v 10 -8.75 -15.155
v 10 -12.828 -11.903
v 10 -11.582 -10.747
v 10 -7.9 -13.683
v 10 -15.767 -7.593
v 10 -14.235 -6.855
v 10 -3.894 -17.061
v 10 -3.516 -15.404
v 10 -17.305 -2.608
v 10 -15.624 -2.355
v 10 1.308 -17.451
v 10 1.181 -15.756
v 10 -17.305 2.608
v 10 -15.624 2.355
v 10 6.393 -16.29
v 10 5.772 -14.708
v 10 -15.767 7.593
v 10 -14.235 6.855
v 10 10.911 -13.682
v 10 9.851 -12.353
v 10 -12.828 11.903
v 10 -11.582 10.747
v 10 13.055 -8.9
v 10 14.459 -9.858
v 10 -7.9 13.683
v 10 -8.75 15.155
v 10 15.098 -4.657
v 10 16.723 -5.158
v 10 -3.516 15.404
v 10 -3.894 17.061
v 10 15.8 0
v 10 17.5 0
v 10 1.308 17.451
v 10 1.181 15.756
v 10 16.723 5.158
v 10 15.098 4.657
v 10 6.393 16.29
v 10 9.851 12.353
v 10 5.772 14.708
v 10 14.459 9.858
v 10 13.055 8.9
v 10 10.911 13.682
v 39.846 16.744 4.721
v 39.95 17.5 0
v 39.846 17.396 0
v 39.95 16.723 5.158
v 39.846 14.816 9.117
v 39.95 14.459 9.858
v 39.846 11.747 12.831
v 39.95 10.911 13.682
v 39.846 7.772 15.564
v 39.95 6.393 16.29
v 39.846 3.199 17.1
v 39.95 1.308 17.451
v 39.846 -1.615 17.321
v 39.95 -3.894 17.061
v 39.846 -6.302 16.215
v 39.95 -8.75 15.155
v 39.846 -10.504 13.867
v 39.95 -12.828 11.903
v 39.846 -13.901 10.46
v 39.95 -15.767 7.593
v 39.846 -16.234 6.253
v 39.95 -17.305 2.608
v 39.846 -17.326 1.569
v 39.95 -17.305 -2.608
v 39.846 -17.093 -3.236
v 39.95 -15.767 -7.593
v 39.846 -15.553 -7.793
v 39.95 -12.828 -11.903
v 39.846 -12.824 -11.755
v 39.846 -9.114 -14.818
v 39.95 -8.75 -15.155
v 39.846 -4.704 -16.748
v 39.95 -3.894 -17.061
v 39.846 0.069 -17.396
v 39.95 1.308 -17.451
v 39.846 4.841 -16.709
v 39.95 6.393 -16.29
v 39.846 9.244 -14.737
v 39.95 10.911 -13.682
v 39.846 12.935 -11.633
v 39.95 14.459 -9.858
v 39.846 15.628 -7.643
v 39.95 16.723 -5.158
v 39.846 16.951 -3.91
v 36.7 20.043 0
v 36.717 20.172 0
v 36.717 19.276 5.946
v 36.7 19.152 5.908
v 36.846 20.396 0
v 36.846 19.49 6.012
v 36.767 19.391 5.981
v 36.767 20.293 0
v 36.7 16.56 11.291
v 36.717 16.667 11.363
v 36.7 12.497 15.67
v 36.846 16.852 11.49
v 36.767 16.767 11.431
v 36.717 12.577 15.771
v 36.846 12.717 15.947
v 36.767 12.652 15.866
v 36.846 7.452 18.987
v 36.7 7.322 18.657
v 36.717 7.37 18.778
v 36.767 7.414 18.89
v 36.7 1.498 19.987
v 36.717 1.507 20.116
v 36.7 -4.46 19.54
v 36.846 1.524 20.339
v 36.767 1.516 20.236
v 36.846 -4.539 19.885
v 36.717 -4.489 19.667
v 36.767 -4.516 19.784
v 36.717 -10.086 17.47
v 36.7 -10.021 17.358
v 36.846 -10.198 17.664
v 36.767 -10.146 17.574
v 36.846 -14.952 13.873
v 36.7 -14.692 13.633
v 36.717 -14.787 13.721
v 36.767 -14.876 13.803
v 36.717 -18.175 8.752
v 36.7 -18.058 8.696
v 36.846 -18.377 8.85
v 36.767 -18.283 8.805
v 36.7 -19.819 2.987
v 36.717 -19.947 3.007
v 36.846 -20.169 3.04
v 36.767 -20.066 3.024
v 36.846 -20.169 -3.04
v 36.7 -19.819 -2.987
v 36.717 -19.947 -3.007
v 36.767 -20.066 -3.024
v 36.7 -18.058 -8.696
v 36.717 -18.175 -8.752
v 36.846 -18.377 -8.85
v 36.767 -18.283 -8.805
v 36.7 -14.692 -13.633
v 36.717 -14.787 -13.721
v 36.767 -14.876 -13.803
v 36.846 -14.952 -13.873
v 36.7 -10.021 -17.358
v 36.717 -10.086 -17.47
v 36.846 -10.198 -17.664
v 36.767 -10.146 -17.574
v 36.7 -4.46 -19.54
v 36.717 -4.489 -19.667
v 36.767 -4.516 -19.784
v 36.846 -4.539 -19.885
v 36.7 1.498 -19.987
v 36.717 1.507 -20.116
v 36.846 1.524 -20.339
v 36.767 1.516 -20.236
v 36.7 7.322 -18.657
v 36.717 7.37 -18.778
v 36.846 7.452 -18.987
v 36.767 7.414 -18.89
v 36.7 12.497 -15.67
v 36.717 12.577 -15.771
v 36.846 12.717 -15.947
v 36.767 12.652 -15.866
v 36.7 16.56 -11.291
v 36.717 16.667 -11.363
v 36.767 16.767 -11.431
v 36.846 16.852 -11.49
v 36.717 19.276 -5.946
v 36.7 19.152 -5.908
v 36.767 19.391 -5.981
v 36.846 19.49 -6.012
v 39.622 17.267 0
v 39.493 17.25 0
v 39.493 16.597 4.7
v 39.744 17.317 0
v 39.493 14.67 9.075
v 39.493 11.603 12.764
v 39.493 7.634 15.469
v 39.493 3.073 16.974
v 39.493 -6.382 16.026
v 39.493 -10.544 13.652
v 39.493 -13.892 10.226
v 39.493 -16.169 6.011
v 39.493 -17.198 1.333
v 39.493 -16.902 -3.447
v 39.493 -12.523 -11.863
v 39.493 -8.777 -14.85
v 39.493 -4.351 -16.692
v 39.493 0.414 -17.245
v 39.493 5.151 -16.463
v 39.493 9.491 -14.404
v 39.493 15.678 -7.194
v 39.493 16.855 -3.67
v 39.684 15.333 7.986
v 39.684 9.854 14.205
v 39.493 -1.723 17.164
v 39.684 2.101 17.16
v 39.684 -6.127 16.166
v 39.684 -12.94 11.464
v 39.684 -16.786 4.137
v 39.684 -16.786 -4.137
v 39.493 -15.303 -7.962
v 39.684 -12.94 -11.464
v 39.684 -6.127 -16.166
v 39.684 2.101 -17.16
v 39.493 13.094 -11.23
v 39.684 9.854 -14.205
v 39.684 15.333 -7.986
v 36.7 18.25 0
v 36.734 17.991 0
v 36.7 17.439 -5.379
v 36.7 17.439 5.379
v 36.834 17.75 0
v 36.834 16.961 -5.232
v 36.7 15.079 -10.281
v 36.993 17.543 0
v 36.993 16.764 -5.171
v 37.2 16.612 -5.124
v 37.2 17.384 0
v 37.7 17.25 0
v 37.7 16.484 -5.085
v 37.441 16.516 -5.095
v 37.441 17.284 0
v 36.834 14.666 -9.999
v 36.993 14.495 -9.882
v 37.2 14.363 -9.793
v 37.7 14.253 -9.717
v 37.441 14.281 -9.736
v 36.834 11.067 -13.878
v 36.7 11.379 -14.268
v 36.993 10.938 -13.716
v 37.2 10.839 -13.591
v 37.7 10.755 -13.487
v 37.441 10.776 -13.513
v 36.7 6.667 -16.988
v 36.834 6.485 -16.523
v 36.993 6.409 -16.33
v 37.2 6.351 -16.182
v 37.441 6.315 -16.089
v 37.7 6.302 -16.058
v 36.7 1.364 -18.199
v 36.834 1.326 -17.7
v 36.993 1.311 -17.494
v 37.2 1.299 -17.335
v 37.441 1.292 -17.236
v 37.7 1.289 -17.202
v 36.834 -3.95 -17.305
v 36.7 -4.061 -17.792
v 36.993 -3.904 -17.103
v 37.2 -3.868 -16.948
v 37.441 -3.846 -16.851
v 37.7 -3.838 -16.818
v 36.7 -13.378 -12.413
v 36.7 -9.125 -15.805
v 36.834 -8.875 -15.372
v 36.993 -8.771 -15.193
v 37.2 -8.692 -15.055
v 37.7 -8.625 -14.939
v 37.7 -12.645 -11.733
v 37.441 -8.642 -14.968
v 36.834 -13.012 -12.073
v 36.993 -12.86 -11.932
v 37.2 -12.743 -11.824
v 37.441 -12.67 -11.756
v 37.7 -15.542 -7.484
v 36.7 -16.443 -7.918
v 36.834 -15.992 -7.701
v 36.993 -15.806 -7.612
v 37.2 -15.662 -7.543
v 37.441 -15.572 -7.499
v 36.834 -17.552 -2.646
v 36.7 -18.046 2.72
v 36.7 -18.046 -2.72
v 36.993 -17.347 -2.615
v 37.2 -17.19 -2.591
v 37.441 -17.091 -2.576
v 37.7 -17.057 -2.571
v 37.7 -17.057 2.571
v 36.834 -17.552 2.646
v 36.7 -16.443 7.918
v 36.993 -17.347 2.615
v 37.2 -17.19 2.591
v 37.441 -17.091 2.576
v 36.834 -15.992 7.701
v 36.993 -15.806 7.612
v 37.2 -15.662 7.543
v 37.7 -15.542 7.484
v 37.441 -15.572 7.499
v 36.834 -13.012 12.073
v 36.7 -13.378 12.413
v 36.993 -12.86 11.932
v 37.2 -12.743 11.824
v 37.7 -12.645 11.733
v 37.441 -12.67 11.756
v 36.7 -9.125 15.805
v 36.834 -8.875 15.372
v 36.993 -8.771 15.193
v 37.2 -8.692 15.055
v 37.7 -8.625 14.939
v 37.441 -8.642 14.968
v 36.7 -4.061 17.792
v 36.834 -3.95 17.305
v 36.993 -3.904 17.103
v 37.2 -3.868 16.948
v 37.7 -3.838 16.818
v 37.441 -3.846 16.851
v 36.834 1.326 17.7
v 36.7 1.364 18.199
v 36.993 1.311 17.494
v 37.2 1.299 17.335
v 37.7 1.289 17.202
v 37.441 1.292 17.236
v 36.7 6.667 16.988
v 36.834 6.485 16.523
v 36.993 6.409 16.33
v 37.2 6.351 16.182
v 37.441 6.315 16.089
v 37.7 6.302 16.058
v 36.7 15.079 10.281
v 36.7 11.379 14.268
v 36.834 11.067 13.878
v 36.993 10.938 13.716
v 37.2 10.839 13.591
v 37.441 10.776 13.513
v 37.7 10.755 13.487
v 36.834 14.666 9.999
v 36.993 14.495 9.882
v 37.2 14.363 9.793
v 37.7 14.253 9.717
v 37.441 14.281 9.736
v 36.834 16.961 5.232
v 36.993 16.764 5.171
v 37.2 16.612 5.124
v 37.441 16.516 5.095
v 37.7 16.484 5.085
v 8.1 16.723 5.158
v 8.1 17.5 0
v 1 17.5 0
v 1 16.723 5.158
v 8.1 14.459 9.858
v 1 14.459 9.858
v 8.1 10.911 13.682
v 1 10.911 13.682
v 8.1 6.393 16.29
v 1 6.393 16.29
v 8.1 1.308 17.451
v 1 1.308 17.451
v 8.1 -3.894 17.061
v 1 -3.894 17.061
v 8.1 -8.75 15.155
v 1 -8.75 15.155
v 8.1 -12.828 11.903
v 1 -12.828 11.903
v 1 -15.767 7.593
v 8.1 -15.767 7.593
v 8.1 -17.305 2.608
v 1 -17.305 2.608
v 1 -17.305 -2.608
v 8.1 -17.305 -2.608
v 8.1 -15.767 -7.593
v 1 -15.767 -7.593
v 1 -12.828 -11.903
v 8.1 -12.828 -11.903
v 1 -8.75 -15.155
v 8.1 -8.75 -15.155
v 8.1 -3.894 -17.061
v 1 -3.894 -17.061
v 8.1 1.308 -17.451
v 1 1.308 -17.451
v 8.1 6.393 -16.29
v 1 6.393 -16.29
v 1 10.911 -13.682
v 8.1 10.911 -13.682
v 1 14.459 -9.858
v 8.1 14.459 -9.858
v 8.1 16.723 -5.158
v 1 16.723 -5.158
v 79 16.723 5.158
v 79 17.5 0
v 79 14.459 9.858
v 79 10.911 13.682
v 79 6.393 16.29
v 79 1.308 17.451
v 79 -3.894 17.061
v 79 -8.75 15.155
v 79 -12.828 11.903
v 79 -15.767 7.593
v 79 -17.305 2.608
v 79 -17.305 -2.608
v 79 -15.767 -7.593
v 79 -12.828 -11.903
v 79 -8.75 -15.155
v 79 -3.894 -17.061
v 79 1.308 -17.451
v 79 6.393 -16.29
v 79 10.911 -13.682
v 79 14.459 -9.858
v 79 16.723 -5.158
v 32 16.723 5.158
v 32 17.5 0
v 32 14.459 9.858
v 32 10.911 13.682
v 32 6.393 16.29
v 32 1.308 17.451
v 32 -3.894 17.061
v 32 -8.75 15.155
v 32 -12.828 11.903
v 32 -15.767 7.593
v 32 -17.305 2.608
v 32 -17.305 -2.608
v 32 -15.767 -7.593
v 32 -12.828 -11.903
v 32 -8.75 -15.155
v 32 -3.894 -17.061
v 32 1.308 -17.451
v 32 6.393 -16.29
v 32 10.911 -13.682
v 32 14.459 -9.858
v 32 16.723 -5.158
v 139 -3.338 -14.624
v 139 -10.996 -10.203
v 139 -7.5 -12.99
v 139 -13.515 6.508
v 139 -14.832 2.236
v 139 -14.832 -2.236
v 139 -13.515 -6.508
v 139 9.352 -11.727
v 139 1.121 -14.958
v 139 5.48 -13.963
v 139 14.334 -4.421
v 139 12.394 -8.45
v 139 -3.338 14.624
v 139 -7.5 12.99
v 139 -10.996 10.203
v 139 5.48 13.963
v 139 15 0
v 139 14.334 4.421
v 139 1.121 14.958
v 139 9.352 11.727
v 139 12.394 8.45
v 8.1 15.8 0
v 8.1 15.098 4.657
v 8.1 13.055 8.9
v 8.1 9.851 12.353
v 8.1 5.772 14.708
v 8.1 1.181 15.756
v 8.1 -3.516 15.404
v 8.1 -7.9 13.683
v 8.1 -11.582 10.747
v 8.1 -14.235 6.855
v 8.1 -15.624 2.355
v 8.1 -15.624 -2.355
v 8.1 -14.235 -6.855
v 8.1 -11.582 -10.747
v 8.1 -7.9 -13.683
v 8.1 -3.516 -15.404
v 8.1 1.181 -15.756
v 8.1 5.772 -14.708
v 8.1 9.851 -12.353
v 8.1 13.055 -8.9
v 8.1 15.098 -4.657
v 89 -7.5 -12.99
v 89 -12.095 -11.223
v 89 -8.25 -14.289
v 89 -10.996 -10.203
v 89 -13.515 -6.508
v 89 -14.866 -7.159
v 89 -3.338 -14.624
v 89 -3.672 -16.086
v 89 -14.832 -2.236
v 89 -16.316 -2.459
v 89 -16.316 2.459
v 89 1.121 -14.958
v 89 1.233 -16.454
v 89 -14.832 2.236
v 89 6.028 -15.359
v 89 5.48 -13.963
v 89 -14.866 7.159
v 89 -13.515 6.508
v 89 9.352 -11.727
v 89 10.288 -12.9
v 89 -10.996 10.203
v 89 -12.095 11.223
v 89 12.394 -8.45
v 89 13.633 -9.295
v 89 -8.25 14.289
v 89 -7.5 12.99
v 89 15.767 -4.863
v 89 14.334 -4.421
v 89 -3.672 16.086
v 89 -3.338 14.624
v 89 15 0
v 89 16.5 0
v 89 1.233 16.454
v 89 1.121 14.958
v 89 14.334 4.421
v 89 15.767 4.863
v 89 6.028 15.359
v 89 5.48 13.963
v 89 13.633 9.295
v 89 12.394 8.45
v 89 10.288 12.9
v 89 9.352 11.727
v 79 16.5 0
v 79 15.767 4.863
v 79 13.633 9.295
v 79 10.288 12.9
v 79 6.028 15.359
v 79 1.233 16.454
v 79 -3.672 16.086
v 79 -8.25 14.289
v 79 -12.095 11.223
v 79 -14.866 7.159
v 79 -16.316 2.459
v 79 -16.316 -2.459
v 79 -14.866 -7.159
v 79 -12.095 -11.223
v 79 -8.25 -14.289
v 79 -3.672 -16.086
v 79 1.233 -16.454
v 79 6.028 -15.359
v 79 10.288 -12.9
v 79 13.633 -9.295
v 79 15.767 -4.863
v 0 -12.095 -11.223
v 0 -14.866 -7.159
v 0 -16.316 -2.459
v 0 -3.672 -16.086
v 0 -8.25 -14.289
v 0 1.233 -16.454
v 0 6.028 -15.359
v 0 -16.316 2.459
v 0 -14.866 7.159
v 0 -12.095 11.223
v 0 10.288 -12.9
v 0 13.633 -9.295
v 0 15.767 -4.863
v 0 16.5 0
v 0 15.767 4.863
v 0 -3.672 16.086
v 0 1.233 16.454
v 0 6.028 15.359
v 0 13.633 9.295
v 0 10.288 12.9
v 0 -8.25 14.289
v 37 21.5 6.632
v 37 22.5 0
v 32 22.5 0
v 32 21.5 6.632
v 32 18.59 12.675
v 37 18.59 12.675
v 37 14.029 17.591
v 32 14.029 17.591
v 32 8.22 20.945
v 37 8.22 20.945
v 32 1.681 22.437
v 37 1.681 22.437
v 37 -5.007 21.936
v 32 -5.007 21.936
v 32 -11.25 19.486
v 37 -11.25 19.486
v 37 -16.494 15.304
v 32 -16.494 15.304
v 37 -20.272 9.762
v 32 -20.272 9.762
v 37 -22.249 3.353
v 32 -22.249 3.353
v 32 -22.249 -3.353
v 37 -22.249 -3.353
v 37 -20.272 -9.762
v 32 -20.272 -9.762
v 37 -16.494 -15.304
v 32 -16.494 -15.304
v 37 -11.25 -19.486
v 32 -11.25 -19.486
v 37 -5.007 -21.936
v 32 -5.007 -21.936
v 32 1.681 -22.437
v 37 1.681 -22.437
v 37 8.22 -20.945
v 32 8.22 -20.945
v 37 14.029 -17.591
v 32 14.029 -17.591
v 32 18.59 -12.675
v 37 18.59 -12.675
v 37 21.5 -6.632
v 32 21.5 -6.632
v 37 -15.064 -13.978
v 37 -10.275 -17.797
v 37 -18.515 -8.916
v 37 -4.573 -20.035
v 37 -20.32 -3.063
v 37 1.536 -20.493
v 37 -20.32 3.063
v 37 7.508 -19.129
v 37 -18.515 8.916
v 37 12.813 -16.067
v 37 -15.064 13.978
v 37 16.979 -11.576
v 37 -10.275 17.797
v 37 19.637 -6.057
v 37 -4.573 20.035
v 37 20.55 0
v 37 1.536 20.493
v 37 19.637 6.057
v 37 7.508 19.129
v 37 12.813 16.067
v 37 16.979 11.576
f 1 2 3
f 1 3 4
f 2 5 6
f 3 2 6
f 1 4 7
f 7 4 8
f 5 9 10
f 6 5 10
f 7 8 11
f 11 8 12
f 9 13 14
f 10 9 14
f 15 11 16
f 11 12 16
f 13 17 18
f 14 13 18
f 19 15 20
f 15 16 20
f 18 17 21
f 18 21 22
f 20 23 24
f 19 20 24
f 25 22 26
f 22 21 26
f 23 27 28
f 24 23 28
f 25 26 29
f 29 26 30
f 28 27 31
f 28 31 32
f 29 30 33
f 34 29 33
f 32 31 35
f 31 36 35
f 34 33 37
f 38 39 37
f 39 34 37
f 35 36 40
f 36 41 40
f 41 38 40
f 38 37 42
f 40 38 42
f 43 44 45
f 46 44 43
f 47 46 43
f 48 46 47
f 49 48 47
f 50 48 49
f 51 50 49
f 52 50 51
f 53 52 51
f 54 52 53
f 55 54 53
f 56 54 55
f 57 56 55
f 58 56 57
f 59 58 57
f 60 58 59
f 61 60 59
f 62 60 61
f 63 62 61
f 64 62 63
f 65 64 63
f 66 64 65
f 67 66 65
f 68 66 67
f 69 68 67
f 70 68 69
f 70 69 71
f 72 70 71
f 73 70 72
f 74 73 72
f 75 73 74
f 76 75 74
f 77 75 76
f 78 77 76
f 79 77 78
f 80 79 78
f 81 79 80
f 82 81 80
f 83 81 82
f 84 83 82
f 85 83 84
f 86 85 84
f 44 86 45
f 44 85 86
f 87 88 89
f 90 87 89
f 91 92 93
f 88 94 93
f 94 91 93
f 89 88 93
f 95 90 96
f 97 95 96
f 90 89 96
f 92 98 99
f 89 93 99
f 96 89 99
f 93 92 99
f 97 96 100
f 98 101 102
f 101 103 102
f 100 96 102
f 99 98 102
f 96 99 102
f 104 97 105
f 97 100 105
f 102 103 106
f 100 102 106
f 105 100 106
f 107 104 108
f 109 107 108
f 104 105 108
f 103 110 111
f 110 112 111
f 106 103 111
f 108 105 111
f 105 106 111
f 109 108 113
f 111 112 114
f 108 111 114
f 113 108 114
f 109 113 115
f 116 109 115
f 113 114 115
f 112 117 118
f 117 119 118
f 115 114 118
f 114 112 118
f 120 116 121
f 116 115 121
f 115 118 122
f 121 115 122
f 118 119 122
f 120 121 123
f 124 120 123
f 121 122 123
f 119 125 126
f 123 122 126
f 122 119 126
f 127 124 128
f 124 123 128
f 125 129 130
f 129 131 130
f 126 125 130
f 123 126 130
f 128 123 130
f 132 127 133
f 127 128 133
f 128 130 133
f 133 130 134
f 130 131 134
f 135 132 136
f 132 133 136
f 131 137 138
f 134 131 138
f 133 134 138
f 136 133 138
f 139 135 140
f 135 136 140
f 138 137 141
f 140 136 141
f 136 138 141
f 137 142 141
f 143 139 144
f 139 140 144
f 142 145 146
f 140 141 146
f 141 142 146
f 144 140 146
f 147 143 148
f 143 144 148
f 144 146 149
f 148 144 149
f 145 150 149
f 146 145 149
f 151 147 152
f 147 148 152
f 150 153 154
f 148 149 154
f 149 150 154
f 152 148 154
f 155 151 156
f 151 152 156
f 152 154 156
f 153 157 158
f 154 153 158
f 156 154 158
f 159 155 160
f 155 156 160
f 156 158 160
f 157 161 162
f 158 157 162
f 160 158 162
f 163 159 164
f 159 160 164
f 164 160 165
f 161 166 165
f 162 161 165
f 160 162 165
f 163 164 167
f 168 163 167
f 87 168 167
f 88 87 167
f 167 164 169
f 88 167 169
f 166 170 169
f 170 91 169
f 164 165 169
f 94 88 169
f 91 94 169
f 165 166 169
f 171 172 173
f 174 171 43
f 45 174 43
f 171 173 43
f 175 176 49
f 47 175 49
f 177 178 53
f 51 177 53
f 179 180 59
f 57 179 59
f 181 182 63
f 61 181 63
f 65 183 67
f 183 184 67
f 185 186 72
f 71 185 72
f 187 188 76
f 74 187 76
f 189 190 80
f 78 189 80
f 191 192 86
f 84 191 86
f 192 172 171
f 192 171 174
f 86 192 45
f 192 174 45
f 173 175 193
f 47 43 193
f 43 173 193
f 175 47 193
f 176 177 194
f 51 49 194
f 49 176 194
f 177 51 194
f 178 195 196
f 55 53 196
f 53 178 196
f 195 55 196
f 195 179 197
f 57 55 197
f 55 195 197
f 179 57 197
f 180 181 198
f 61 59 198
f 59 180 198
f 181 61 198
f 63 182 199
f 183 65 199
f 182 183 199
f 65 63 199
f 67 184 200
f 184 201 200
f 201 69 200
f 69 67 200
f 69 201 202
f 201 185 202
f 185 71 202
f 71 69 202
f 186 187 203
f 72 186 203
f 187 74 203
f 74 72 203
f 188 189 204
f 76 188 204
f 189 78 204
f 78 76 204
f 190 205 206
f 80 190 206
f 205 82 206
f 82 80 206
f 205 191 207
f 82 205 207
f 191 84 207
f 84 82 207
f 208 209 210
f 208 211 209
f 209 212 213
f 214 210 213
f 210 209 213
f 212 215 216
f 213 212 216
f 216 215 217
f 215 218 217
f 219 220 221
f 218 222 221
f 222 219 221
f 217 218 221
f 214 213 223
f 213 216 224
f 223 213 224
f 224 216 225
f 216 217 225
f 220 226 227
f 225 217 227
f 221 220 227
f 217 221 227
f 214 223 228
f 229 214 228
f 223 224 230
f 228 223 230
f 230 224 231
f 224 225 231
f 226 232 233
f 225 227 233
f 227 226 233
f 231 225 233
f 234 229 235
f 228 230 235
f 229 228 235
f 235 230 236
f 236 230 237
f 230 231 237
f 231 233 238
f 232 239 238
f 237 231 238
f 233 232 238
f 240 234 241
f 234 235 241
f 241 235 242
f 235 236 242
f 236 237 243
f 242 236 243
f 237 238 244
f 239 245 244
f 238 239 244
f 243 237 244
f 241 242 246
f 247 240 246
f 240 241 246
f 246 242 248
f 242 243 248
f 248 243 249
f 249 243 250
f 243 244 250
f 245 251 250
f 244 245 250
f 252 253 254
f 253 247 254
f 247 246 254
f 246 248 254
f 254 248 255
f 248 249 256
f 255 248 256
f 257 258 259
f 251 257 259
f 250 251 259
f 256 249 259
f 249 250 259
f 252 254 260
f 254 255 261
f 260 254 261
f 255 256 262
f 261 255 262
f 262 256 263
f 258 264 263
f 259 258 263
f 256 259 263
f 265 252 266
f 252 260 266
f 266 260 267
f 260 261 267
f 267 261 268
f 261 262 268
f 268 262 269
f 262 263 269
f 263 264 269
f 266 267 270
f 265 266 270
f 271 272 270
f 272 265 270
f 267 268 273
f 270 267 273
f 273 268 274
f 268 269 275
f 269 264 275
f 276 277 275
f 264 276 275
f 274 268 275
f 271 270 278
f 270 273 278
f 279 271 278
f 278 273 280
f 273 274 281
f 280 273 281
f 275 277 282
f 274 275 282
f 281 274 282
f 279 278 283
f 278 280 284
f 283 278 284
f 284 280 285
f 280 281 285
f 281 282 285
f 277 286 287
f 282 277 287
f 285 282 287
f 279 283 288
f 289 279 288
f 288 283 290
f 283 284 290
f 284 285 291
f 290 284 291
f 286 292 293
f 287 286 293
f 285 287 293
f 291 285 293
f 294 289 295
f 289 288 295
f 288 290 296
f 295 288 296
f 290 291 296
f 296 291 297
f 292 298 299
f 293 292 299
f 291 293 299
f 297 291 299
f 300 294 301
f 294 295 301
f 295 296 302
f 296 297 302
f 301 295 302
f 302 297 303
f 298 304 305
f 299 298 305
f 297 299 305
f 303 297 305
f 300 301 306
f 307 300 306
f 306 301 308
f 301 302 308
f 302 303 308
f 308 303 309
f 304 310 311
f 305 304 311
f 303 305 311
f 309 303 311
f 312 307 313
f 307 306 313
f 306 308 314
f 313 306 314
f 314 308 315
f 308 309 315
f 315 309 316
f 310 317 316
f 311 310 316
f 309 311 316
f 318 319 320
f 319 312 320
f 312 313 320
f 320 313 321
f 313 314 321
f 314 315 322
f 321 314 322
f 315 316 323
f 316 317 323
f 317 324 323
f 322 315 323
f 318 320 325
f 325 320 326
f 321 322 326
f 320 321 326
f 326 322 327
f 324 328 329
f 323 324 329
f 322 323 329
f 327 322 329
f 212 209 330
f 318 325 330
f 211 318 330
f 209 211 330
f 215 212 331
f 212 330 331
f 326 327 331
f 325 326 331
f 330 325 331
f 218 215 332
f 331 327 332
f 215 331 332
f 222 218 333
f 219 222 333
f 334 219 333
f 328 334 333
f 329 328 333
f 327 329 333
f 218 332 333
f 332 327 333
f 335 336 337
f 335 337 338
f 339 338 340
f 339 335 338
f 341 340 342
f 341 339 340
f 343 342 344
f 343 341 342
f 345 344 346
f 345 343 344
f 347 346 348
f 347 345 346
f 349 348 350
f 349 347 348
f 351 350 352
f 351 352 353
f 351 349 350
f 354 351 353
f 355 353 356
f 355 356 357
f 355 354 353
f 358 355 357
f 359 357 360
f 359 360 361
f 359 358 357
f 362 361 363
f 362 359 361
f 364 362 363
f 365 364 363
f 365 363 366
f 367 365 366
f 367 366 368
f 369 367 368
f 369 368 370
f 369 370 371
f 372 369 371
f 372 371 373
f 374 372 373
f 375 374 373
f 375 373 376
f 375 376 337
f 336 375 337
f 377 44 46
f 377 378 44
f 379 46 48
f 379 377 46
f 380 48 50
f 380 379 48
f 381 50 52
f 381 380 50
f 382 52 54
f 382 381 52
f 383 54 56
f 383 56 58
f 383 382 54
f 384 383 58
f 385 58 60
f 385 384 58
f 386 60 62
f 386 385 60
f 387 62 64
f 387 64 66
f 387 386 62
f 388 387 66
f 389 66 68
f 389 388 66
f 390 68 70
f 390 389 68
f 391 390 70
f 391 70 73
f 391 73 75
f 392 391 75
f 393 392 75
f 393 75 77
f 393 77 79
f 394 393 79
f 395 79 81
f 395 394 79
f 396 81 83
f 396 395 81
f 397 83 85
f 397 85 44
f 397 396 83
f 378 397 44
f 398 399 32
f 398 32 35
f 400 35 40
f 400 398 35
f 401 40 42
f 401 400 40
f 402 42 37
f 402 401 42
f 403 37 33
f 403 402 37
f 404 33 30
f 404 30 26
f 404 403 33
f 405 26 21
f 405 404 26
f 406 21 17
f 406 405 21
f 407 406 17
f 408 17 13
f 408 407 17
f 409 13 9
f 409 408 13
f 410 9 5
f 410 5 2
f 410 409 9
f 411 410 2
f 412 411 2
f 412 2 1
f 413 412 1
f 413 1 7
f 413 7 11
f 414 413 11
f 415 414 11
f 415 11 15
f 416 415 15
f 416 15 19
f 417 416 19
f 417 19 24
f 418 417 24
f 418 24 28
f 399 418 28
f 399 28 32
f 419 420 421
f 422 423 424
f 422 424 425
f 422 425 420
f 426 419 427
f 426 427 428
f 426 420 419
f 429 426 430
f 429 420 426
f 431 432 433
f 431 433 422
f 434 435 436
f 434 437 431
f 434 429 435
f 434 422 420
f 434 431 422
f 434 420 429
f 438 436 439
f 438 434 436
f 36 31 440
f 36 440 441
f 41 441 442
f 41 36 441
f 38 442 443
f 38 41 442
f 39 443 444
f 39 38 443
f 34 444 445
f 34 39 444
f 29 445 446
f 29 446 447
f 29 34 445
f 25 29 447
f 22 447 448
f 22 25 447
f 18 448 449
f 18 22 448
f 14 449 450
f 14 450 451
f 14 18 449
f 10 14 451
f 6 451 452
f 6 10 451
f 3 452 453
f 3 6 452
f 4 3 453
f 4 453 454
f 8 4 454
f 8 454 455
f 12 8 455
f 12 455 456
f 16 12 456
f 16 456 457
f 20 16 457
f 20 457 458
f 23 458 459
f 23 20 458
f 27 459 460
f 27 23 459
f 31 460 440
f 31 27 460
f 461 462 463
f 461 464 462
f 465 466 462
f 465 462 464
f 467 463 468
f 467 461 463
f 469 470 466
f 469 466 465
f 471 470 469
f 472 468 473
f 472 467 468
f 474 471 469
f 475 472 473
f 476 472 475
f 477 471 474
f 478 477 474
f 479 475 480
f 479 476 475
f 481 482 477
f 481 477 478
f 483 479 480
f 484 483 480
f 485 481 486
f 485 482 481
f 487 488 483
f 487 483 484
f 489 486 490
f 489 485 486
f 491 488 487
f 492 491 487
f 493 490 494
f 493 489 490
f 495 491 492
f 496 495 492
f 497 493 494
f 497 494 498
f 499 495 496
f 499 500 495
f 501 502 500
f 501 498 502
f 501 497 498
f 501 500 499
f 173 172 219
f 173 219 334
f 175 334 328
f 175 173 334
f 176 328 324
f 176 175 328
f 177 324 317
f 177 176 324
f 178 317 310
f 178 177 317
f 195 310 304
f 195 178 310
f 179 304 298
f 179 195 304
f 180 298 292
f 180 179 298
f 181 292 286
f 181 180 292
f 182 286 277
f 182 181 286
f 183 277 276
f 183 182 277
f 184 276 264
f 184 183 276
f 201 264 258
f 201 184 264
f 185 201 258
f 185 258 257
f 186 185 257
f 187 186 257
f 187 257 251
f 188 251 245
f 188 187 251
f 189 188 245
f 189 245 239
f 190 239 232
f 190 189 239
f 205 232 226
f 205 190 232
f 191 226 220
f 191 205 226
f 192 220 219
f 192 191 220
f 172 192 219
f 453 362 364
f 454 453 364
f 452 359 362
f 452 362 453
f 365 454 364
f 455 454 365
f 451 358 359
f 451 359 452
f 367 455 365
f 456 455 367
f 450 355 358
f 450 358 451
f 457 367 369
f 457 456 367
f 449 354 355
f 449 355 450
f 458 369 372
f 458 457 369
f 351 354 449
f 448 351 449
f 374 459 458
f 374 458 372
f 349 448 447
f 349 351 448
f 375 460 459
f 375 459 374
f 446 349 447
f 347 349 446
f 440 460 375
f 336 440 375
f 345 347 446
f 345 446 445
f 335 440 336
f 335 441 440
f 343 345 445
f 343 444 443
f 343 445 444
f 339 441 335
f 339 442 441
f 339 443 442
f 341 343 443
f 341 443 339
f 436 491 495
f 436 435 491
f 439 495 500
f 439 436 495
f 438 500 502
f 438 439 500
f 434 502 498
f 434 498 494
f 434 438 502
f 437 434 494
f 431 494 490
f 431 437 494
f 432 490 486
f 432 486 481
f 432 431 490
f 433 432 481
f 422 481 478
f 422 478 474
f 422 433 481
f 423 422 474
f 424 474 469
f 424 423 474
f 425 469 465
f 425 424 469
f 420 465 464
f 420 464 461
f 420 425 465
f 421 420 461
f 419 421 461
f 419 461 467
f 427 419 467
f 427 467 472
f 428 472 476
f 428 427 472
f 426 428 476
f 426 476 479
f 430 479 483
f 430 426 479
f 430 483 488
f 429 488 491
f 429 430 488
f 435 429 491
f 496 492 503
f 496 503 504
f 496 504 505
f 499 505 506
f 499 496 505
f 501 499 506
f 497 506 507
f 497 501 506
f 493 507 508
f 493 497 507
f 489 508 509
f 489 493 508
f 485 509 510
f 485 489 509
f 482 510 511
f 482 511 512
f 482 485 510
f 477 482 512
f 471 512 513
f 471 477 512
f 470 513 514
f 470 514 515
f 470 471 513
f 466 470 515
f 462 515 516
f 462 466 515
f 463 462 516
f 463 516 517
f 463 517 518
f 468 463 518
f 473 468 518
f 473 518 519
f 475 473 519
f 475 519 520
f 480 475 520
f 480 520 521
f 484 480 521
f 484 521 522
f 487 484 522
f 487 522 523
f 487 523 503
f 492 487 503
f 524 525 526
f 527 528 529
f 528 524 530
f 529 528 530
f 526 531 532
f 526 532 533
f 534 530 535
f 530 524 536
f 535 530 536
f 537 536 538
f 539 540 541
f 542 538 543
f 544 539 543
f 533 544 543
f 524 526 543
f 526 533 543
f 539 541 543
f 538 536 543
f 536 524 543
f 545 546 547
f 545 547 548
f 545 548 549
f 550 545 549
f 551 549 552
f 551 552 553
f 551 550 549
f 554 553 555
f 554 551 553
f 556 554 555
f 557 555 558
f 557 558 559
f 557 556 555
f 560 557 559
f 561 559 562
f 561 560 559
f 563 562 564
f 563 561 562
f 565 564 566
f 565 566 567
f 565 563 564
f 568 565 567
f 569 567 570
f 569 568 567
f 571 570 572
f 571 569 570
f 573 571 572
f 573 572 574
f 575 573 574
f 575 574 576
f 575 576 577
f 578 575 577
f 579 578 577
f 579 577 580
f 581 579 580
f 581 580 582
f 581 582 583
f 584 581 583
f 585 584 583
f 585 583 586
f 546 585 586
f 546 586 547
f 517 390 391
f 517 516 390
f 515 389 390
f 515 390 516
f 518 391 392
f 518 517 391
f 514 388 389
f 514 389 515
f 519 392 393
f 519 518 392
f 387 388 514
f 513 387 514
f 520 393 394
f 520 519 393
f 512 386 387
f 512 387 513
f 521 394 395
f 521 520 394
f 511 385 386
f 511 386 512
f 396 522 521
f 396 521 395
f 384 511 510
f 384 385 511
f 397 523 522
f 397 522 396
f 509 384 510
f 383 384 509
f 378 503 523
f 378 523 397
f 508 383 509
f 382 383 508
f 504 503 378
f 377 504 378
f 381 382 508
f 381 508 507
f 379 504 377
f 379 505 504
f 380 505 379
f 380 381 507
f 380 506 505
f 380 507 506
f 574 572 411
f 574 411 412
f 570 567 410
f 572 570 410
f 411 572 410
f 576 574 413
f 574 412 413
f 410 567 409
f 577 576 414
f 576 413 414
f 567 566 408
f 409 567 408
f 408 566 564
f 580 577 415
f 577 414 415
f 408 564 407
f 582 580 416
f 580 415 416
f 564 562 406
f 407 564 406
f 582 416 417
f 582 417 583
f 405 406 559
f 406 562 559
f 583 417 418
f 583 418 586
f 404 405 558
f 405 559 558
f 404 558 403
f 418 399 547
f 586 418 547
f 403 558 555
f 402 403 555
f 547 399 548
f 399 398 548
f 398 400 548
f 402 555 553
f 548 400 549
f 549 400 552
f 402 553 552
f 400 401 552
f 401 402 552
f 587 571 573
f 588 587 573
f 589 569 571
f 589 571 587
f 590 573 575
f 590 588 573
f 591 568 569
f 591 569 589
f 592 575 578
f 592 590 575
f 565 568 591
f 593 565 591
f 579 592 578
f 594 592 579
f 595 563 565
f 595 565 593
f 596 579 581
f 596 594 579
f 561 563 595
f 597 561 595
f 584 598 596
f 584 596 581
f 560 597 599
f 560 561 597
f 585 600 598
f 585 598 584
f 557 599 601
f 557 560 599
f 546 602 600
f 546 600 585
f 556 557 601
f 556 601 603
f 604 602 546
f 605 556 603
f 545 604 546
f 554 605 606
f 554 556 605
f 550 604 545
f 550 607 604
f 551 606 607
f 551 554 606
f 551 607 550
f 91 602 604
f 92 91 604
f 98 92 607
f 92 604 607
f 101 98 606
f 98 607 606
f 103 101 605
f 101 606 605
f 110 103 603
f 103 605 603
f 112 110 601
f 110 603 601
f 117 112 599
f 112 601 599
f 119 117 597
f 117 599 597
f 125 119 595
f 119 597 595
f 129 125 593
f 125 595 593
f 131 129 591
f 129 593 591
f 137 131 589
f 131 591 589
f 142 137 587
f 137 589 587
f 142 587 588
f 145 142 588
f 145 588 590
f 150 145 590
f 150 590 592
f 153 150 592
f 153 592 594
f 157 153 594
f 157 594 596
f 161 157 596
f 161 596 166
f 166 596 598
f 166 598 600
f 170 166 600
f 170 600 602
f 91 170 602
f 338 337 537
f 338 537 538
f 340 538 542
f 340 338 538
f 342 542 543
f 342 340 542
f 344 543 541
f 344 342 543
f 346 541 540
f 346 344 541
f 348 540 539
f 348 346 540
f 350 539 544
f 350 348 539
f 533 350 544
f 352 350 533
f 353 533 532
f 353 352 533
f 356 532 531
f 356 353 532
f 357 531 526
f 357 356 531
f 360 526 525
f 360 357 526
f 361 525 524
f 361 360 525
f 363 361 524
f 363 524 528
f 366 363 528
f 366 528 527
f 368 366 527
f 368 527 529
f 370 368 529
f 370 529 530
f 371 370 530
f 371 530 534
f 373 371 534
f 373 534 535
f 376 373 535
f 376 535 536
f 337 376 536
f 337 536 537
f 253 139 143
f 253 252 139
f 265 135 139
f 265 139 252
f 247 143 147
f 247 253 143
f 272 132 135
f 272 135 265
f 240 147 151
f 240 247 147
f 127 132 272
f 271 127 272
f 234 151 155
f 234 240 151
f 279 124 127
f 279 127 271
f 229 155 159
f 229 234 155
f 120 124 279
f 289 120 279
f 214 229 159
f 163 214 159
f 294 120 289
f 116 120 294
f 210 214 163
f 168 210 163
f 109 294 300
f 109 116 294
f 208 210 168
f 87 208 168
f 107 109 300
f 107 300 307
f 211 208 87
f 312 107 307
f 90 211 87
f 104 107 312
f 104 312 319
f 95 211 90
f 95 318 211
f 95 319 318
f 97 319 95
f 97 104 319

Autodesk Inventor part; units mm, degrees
ref_plane "YZ Plane" through (0, 0, 0) normal (1, 0, 0) x (0, 1, 0)
ref_plane "XZ Plane" through (0, 0, 0) normal (0, 1, 0) x (-1, 0, 0)
ref_plane "XY Plane" through (0, 0, 0) normal (0, 0, 1) x (1, 0, 0)
sketch "Эскиз1" plane through (0, 0, 0) normal (0, 0, 1) x (1, 0, 0)
  line L0 (0, 0) -> (0, 17.5)
  line L1 (0, 17.5) -> (8.1, 17.5)
  line L2 (8.1, 17.5) -> (8.1, 15.8)
  line L3 (8.1, 15.8) -> (10, 15.8)
  line L4 (10, 15.8) -> (10, 17.5)
  line L5 (10, 17.5) -> (32, 17.5)
  line L6 (32, 17.5) -> (32, 22.5)
  line L7 (32, 22.5) -> (37, 22.5)
  line L8 (37, 22.5) -> (37, 17.5)
  line L9 (37, 17.5) -> (79, 17.5)
  line L10 (79, 17.5) -> (79, 16.5)
  line L11 (79, 16.5) -> (89, 16.5)
  line L12 (89, 16.5) -> (89, 15)
  line L13 (89, 15) -> (139, 15)
  line L14 (139, 15) -> (139, 0)
  line L15 (139, 0) -> (0, 0)
  line L16 (-27.8, 0) -> (166.8, 0) construction
  line L17 (0, -4.5) -> (0, 27) construction
  point P0 (0, 0)
  dimension "d1" = 1.9
  dimension "d2" = 10
  dimension "d3" = 22
  dimension "d4" = 5
  dimension "d5" = 42
  dimension "d6" = 10
  dimension "d7" = 50
  dimension "d12" = 0
  dimension "d13" = 1.7
  dimension "d14" = 0
  dimension "d16" = 35
  dimension "d17" = 45
  dimension "d18" = 33
  dimension "d20" = 30
revolve "Вращение1" add sketch "Эскиз1" angle 360 about axis through (-10, 0, 0) along (1, 0, 0)
thread "Резьба1" size "M33x1.5" class "6g" standard "ANSI Metric M Profile" full length
chamfer "Фаска1" distance 1 angle 45 1 edges at (0, -17.5, 0)
sketch "Эскиз2" plane through (0, 0, 0) normal (0, 0, 1) x (1, 0, 0)
  line L0 (37, 17.5) -> (79, 17.5) construction
  line L1 (37, -22.5) -> (37, 22.5) construction
  line L2 (37, 20.55) -> (36.7, 20.25)
  line L3 (36.7, 20.25) -> (36.7, 17.25)
  line L4 (36.7, 17.25) -> (39.7, 17.25)
  line L5 (39.7, 17.25) -> (39.95, 17.5)
  line L6 (37, 20.55) -> (39.95, 20.55)
  line L7 (39.95, 20.55) -> (39.95, 17.5)
  line L8 (-27.8, 0) -> (166.8, 0) projected
  point P0 (0, 0)
  dimension "d27" = 45
  dimension "d28" = 45
  dimension "d29" = 3
  dimension "d31" = 0.3
  dimension "d32" = 0.25
revolve "Вращение2" cut sketch "Эскиз2" angle 360 about axis through (-10, 0, 0) along (1, 0, 0)
fillet "Сопряжение1" radius 1 1 edges at (36.7, -17.25, 0)
fillet "Сопряжение2" radius 0.5 1 edges at (36.7, -20.25, 0)
fillet "Сопряжение3" radius 0.5 1 edges at (39.7, -17.25, 0)
properties part number "big"
